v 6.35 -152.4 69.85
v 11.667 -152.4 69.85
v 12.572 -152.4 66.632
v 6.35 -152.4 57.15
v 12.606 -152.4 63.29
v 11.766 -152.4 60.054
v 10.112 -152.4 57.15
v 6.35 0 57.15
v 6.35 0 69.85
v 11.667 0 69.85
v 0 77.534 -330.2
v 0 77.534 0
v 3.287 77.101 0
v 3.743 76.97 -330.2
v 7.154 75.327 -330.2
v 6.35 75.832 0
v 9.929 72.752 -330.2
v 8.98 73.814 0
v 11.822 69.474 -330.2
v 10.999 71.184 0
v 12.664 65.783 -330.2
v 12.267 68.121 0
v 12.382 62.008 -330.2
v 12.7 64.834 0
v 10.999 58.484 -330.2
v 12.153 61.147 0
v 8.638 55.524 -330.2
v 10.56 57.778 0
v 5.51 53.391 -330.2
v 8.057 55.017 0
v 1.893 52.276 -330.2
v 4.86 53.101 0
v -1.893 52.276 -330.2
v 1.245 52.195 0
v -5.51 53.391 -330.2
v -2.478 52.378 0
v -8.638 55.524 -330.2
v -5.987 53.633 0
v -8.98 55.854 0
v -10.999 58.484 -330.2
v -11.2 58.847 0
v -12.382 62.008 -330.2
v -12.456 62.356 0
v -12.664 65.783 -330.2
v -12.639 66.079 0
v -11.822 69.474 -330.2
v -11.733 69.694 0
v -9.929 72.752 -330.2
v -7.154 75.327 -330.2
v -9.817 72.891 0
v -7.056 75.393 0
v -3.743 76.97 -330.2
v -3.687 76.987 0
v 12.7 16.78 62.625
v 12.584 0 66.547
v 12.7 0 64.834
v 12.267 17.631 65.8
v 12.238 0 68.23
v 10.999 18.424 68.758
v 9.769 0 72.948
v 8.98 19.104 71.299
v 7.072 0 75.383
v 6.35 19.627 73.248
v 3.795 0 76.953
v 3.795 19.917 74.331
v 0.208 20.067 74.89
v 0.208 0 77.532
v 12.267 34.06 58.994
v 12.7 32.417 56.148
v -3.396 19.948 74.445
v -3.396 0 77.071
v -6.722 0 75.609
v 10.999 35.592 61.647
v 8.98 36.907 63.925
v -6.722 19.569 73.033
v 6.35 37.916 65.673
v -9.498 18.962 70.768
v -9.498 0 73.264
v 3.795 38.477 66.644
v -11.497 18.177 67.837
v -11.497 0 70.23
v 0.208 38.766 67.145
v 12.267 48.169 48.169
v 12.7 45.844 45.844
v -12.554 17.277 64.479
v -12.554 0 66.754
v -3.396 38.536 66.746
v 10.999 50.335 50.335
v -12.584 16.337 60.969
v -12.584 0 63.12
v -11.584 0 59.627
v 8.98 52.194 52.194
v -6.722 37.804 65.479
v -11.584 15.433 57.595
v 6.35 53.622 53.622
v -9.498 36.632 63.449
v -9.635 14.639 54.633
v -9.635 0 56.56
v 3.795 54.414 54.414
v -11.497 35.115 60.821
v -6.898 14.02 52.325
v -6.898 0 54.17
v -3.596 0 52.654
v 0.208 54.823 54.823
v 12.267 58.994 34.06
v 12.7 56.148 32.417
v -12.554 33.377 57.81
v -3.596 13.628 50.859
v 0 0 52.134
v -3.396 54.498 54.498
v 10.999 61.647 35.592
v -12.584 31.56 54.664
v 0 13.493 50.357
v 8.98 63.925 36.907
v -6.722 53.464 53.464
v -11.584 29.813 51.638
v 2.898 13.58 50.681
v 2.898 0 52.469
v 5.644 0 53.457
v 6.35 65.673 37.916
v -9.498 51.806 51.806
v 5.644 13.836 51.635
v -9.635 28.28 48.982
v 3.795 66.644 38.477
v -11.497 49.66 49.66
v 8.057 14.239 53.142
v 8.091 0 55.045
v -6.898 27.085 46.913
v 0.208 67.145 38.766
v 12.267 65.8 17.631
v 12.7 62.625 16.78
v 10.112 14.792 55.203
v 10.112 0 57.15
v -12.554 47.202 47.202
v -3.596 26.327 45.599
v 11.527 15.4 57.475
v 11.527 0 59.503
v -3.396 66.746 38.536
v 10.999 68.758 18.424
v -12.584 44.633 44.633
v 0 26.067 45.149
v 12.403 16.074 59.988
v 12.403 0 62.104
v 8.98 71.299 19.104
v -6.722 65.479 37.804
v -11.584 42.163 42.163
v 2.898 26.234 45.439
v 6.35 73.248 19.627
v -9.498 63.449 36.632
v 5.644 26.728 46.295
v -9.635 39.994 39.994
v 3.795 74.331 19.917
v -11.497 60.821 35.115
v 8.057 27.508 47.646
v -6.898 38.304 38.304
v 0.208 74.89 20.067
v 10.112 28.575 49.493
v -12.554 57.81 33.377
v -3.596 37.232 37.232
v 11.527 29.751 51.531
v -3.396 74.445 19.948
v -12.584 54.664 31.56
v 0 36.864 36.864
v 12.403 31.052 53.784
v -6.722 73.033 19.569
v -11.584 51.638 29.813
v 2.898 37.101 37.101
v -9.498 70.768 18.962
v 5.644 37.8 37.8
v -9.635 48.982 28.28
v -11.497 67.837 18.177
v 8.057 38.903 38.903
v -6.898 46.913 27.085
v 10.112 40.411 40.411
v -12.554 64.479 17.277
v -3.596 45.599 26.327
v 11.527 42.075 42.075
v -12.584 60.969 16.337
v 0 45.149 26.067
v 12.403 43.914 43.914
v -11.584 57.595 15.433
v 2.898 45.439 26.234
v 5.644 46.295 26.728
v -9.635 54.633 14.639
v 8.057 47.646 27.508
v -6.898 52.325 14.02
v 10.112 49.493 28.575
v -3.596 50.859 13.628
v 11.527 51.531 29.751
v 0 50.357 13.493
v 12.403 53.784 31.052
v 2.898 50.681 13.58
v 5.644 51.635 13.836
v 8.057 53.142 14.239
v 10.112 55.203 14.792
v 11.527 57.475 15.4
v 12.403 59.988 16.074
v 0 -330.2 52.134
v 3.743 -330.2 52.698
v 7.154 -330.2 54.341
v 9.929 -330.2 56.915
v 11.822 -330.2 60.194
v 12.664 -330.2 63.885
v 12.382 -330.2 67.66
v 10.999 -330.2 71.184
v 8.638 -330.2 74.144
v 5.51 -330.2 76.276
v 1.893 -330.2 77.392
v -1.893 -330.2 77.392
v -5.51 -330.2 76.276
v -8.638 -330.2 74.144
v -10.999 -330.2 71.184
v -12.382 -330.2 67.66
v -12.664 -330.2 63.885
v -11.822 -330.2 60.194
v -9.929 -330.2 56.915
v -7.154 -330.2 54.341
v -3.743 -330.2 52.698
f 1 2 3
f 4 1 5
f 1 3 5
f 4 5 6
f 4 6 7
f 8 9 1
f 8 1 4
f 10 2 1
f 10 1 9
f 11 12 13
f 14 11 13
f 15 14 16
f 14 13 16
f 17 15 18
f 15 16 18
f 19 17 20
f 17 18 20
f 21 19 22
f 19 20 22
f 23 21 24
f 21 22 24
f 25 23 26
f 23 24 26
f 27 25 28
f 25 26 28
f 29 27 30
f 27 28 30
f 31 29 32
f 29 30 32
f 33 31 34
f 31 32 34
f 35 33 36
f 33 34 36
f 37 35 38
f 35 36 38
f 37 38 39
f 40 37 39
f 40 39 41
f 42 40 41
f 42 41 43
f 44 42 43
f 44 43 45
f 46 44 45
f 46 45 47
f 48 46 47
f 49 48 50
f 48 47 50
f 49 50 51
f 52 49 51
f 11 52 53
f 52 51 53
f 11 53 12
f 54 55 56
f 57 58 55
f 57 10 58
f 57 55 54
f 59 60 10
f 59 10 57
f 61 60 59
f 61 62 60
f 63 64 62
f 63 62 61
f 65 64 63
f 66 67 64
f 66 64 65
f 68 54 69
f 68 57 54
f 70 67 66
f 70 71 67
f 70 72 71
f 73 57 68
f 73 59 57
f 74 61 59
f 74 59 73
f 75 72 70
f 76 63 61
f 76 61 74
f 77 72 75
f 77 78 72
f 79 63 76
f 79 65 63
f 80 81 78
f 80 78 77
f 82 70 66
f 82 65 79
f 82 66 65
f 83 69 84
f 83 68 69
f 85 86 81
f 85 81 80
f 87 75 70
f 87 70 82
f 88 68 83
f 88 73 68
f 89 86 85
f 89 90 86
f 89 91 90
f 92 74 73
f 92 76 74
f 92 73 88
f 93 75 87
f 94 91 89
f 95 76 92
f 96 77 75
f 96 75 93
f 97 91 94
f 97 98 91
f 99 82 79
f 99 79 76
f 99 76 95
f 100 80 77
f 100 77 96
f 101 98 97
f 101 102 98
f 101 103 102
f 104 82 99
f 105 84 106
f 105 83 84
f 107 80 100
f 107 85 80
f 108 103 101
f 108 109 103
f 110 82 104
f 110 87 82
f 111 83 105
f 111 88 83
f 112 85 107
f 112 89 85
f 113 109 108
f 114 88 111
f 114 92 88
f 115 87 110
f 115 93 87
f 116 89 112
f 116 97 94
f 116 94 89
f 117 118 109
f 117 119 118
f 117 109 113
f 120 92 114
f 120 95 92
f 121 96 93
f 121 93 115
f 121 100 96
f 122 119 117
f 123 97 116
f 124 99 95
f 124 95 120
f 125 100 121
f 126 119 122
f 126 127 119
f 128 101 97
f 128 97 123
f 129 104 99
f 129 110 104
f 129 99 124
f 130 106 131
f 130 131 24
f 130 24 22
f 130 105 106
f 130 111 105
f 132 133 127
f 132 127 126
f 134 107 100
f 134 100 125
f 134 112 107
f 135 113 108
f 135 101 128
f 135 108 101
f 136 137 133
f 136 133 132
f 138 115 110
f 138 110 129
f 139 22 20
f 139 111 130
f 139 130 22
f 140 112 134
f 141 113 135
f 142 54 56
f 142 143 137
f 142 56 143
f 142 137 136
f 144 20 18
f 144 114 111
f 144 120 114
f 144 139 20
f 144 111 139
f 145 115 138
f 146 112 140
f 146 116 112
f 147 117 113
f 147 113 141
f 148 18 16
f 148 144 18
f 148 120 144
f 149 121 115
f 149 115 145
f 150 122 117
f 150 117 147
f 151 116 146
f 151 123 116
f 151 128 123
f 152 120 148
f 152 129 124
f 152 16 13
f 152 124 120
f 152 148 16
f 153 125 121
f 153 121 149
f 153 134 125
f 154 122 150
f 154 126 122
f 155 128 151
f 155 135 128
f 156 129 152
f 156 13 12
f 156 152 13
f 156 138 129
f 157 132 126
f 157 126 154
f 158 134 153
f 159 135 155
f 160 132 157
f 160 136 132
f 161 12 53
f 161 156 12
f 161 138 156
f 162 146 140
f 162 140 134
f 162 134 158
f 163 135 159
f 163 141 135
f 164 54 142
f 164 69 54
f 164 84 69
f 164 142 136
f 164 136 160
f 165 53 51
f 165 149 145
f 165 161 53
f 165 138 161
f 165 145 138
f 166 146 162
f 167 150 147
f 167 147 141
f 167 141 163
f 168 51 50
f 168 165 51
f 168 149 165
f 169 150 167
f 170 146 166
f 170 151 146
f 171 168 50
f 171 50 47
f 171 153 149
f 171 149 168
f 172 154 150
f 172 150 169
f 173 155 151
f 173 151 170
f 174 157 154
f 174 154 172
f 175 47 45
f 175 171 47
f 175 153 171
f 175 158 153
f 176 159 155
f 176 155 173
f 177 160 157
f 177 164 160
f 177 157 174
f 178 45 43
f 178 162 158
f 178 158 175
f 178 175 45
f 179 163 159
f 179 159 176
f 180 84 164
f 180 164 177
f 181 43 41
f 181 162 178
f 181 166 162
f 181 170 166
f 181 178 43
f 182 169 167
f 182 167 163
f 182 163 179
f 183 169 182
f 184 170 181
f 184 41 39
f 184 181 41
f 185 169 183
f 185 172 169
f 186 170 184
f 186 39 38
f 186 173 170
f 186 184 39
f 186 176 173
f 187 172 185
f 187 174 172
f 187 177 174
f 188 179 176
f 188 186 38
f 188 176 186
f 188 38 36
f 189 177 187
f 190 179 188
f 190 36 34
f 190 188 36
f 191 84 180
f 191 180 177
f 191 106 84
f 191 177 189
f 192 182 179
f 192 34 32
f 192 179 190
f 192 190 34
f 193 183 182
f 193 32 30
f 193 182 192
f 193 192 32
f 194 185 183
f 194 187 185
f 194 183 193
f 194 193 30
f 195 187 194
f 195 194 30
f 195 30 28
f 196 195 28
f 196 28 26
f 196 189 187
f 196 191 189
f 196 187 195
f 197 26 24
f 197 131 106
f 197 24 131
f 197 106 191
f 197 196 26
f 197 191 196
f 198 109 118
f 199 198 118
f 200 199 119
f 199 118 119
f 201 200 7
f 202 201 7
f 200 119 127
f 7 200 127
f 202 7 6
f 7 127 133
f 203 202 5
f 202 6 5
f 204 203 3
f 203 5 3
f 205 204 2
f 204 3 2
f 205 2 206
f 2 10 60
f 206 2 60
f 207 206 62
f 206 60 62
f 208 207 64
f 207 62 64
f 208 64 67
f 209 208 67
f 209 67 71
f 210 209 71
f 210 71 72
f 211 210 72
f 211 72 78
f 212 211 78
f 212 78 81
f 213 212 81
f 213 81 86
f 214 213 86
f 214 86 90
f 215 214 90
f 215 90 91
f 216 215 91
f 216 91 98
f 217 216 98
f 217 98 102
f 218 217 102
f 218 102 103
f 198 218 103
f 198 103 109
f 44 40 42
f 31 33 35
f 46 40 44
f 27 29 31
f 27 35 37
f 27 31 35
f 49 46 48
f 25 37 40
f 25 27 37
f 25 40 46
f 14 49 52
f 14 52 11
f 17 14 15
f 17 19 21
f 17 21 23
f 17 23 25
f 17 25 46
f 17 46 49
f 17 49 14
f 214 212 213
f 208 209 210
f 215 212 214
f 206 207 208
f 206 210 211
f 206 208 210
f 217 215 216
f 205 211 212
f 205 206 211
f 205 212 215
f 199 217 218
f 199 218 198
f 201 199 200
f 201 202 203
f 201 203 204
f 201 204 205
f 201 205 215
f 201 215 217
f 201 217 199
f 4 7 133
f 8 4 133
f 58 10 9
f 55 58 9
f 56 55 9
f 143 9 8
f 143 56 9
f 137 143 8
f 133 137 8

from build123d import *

# Parameters (mm, degrees)
SKETCH3_R           = 12.7
SKETCH4_R           = 12.7
BOSS_EXTRUDE3_DEPTH = 330.2
SKETCH5_R           = 12.7
BOSS_EXTRUDE4_DEPTH = 330.2
SKETCH7_W           = 12.7
SKETCH7_H           = 152.4
CUT_EXTRUDE2_DEPTH  = 6.35


with BuildPart() as part:
    # Sweep1: sweep along a path in Sketch2
    with BuildLine(Plane(origin=(0, 0, 0), x_dir=(0, 0, -1), z_dir=(1, 0, 0))) as sweep1_path:
        ThreePointArc((-64.833774642, 0), (-45.844401699, 45.844401699), (0, 64.833774642))
    # Sketch3 → Sweep1 (sweep)
    with BuildSketch(Plane(origin=(0, 0, 0), x_dir=(1, 0, 0), z_dir=(0, 1, 0))):
        with Locations((0, -64.833774642)):
            Circle(SKETCH3_R)
    sweep(path=sweep1_path.line)

    # Sketch4 → Boss-Extrude3 (add)
    with BuildSketch(Plane(origin=(0, 0, 0), x_dir=(-1, 0, 0), z_dir=(0, -1, 0))):
        with Locations(Location((0, -64.833774642, 0), (0, 0, 90))):
            Circle(SKETCH4_R)
    extrude(amount=BOSS_EXTRUDE3_DEPTH)

    # Sketch5 → Boss-Extrude4 (add)
    with BuildSketch(Plane(origin=(0, 0, 0), x_dir=(-1, 0, 0), z_dir=(0, 0, -1))):
        with Locations(Location((0, 64.833774642, 0), (0, 0, 90))):
            Circle(SKETCH5_R)
    extrude(amount=BOSS_EXTRUDE4_DEPTH)

    # Sketch7 → Cut-Extrude2 (cut)
    with BuildSketch(Plane(origin=(12.7, 0, 0), x_dir=(0, 0, -1), z_dir=(1, 0, 0))):
        with Locations((-63.5, -76.2)):
            Rectangle(SKETCH7_W, SKETCH7_H)
    extrude(amount=-CUT_EXTRUDE2_DEPTH, mode=Mode.SUBTRACT)


solid = part.part
